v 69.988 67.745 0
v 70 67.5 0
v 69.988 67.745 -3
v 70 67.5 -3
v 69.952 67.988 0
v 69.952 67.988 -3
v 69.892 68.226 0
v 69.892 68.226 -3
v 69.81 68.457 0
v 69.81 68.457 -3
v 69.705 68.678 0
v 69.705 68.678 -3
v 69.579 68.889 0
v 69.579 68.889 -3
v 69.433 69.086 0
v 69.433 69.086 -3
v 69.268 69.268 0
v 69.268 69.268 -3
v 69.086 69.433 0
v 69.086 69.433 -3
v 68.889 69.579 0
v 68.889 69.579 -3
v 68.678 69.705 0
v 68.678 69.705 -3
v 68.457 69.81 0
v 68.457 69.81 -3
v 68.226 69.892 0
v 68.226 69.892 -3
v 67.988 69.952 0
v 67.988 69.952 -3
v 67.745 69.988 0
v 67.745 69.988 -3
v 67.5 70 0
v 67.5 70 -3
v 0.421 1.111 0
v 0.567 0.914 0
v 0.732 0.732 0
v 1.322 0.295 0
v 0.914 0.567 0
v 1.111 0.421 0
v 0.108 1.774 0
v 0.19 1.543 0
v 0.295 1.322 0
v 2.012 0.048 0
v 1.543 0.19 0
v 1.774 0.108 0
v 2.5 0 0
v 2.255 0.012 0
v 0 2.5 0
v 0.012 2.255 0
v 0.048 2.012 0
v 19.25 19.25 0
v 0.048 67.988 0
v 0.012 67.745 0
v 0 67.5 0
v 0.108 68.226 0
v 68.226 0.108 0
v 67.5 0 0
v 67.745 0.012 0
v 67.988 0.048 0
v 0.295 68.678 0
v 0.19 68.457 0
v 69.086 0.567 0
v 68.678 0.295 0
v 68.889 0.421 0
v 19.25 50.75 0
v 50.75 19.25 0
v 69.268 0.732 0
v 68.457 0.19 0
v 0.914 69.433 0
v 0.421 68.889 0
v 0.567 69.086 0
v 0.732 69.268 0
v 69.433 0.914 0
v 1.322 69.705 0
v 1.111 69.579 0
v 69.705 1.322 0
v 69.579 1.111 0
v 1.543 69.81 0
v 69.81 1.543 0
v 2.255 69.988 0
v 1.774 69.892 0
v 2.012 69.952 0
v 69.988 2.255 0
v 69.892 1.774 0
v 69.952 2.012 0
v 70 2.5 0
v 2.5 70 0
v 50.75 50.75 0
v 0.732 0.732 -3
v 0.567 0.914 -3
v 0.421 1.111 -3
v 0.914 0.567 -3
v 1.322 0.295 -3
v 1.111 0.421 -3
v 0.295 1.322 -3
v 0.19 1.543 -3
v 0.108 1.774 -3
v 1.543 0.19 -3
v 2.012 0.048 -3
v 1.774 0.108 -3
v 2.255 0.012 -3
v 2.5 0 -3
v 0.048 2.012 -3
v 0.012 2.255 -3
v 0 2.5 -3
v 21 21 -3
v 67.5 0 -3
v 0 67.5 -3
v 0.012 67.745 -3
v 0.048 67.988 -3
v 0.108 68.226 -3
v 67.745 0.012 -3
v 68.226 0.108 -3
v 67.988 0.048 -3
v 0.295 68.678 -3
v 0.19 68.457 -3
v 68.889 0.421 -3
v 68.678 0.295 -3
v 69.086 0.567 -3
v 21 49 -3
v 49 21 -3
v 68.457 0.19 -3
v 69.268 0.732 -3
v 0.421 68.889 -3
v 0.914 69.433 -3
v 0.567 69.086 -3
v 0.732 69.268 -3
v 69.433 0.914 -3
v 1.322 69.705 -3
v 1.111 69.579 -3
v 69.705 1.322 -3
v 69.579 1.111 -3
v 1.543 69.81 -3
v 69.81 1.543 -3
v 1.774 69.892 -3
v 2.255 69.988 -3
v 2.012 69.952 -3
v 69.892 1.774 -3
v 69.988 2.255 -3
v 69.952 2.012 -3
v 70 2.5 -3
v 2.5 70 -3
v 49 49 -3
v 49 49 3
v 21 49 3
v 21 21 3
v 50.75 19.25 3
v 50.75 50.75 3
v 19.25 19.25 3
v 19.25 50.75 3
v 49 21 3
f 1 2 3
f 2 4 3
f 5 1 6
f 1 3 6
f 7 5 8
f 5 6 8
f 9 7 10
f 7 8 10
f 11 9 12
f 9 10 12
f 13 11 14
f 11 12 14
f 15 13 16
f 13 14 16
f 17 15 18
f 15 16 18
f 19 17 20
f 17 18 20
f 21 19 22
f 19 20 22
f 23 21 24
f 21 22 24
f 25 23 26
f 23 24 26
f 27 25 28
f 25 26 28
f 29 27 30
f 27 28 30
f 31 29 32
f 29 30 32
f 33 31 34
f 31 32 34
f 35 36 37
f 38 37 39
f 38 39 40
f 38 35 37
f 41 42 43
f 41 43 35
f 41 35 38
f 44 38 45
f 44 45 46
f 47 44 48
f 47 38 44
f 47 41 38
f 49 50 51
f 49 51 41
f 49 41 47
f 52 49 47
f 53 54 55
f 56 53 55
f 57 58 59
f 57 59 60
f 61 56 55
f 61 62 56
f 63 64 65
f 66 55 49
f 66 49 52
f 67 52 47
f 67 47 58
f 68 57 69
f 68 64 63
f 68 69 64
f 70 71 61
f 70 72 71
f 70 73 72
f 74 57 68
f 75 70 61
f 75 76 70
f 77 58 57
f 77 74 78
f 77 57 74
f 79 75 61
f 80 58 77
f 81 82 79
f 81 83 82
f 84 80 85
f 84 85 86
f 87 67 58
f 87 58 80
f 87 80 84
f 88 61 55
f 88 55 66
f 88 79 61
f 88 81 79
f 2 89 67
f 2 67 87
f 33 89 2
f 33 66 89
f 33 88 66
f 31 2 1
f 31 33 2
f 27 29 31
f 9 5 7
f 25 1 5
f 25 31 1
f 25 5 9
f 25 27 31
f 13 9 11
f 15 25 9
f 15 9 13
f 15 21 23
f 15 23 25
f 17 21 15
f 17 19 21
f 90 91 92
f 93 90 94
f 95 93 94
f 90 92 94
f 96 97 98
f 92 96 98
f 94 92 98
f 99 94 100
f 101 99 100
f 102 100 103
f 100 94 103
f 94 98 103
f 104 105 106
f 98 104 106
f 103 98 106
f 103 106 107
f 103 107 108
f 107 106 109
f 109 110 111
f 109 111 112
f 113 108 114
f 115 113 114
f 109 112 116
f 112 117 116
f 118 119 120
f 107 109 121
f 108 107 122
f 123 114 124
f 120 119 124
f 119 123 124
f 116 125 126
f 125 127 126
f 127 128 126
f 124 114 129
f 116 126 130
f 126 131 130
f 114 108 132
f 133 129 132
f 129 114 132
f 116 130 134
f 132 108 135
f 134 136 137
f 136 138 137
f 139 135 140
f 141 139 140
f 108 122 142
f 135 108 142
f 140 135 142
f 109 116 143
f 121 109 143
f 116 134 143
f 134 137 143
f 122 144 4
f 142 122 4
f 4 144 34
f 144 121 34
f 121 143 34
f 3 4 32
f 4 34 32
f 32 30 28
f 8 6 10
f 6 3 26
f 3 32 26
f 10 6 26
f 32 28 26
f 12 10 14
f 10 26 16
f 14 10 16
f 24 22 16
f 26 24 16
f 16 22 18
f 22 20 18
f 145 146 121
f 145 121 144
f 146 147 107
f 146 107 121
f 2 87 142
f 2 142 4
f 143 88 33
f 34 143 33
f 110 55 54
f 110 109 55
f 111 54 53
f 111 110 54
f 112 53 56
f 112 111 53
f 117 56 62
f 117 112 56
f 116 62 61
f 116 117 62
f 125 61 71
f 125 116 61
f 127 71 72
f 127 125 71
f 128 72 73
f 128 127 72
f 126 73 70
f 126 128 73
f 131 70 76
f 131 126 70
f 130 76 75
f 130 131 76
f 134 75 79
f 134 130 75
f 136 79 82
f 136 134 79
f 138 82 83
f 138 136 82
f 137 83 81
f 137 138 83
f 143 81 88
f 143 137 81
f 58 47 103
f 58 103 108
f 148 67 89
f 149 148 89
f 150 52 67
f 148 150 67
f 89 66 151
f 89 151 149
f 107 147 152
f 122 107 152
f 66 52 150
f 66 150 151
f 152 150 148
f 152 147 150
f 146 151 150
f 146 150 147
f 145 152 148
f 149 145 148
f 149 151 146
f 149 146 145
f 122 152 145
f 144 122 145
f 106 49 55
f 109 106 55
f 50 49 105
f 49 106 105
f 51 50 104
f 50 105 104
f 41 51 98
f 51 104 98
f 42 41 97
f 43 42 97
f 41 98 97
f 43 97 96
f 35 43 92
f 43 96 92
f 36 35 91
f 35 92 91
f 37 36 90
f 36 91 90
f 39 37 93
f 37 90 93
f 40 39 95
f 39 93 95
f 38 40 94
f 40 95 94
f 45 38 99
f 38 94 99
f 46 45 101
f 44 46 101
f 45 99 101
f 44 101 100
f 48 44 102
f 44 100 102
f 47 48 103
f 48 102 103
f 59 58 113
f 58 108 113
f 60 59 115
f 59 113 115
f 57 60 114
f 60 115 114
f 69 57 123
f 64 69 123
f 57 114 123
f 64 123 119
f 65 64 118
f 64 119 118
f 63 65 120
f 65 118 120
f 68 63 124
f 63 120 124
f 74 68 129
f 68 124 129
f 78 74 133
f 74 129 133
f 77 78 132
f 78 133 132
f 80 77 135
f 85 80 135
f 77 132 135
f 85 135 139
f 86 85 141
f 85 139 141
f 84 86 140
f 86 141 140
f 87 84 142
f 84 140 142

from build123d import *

# Parameters (mm, degrees)
SKETCH001_W  = 70
SKETCH001_H  = 70
PAD001_DEPTH = 3
FILLET001_R  = 2.5
SKETCH002_W  = 31.5
SKETCH002_H  = 31.5
PAD002_DEPTH = 3
SKETCH003_W  = 28
SKETCH003_H  = 28
POCKET_DEPTH = 6.001


with BuildPart() as part:
    # Sketch001 → Pad001 (new body)
    with BuildSketch(Plane.XY):
        with Locations((35, 35)):
            Rectangle(SKETCH001_W, SKETCH001_H)
    extrude(amount=-PAD001_DEPTH)

    # Fillet001
    fillet001_edges = [part.edges().sort_by_distance(p)[0] for p in [
        (70, 70, -1.5),
        (0, 70, -1.5),
        (70, 0, -1.5),
        (0, 0, -1.5),
    ]]
    fillet(fillet001_edges, radius=FILLET001_R)

    # Sketch002 (on Face2 of Fillet001) → Pad002 (join)
    with BuildSketch(Plane.XY):
        with Locations((35, 35)):
            Rectangle(SKETCH002_W, SKETCH002_H)
    extrude(amount=PAD002_DEPTH)

    # Sketch003 (on Face15 of Pad002) → Pocket (cut, through all)
    with BuildSketch(Plane.XY.offset(3)):
        with Locations((35, 35)):
            Rectangle(SKETCH003_W, SKETCH003_H)
    extrude(amount=-POCKET_DEPTH, mode=Mode.SUBTRACT)


solid = part.part
